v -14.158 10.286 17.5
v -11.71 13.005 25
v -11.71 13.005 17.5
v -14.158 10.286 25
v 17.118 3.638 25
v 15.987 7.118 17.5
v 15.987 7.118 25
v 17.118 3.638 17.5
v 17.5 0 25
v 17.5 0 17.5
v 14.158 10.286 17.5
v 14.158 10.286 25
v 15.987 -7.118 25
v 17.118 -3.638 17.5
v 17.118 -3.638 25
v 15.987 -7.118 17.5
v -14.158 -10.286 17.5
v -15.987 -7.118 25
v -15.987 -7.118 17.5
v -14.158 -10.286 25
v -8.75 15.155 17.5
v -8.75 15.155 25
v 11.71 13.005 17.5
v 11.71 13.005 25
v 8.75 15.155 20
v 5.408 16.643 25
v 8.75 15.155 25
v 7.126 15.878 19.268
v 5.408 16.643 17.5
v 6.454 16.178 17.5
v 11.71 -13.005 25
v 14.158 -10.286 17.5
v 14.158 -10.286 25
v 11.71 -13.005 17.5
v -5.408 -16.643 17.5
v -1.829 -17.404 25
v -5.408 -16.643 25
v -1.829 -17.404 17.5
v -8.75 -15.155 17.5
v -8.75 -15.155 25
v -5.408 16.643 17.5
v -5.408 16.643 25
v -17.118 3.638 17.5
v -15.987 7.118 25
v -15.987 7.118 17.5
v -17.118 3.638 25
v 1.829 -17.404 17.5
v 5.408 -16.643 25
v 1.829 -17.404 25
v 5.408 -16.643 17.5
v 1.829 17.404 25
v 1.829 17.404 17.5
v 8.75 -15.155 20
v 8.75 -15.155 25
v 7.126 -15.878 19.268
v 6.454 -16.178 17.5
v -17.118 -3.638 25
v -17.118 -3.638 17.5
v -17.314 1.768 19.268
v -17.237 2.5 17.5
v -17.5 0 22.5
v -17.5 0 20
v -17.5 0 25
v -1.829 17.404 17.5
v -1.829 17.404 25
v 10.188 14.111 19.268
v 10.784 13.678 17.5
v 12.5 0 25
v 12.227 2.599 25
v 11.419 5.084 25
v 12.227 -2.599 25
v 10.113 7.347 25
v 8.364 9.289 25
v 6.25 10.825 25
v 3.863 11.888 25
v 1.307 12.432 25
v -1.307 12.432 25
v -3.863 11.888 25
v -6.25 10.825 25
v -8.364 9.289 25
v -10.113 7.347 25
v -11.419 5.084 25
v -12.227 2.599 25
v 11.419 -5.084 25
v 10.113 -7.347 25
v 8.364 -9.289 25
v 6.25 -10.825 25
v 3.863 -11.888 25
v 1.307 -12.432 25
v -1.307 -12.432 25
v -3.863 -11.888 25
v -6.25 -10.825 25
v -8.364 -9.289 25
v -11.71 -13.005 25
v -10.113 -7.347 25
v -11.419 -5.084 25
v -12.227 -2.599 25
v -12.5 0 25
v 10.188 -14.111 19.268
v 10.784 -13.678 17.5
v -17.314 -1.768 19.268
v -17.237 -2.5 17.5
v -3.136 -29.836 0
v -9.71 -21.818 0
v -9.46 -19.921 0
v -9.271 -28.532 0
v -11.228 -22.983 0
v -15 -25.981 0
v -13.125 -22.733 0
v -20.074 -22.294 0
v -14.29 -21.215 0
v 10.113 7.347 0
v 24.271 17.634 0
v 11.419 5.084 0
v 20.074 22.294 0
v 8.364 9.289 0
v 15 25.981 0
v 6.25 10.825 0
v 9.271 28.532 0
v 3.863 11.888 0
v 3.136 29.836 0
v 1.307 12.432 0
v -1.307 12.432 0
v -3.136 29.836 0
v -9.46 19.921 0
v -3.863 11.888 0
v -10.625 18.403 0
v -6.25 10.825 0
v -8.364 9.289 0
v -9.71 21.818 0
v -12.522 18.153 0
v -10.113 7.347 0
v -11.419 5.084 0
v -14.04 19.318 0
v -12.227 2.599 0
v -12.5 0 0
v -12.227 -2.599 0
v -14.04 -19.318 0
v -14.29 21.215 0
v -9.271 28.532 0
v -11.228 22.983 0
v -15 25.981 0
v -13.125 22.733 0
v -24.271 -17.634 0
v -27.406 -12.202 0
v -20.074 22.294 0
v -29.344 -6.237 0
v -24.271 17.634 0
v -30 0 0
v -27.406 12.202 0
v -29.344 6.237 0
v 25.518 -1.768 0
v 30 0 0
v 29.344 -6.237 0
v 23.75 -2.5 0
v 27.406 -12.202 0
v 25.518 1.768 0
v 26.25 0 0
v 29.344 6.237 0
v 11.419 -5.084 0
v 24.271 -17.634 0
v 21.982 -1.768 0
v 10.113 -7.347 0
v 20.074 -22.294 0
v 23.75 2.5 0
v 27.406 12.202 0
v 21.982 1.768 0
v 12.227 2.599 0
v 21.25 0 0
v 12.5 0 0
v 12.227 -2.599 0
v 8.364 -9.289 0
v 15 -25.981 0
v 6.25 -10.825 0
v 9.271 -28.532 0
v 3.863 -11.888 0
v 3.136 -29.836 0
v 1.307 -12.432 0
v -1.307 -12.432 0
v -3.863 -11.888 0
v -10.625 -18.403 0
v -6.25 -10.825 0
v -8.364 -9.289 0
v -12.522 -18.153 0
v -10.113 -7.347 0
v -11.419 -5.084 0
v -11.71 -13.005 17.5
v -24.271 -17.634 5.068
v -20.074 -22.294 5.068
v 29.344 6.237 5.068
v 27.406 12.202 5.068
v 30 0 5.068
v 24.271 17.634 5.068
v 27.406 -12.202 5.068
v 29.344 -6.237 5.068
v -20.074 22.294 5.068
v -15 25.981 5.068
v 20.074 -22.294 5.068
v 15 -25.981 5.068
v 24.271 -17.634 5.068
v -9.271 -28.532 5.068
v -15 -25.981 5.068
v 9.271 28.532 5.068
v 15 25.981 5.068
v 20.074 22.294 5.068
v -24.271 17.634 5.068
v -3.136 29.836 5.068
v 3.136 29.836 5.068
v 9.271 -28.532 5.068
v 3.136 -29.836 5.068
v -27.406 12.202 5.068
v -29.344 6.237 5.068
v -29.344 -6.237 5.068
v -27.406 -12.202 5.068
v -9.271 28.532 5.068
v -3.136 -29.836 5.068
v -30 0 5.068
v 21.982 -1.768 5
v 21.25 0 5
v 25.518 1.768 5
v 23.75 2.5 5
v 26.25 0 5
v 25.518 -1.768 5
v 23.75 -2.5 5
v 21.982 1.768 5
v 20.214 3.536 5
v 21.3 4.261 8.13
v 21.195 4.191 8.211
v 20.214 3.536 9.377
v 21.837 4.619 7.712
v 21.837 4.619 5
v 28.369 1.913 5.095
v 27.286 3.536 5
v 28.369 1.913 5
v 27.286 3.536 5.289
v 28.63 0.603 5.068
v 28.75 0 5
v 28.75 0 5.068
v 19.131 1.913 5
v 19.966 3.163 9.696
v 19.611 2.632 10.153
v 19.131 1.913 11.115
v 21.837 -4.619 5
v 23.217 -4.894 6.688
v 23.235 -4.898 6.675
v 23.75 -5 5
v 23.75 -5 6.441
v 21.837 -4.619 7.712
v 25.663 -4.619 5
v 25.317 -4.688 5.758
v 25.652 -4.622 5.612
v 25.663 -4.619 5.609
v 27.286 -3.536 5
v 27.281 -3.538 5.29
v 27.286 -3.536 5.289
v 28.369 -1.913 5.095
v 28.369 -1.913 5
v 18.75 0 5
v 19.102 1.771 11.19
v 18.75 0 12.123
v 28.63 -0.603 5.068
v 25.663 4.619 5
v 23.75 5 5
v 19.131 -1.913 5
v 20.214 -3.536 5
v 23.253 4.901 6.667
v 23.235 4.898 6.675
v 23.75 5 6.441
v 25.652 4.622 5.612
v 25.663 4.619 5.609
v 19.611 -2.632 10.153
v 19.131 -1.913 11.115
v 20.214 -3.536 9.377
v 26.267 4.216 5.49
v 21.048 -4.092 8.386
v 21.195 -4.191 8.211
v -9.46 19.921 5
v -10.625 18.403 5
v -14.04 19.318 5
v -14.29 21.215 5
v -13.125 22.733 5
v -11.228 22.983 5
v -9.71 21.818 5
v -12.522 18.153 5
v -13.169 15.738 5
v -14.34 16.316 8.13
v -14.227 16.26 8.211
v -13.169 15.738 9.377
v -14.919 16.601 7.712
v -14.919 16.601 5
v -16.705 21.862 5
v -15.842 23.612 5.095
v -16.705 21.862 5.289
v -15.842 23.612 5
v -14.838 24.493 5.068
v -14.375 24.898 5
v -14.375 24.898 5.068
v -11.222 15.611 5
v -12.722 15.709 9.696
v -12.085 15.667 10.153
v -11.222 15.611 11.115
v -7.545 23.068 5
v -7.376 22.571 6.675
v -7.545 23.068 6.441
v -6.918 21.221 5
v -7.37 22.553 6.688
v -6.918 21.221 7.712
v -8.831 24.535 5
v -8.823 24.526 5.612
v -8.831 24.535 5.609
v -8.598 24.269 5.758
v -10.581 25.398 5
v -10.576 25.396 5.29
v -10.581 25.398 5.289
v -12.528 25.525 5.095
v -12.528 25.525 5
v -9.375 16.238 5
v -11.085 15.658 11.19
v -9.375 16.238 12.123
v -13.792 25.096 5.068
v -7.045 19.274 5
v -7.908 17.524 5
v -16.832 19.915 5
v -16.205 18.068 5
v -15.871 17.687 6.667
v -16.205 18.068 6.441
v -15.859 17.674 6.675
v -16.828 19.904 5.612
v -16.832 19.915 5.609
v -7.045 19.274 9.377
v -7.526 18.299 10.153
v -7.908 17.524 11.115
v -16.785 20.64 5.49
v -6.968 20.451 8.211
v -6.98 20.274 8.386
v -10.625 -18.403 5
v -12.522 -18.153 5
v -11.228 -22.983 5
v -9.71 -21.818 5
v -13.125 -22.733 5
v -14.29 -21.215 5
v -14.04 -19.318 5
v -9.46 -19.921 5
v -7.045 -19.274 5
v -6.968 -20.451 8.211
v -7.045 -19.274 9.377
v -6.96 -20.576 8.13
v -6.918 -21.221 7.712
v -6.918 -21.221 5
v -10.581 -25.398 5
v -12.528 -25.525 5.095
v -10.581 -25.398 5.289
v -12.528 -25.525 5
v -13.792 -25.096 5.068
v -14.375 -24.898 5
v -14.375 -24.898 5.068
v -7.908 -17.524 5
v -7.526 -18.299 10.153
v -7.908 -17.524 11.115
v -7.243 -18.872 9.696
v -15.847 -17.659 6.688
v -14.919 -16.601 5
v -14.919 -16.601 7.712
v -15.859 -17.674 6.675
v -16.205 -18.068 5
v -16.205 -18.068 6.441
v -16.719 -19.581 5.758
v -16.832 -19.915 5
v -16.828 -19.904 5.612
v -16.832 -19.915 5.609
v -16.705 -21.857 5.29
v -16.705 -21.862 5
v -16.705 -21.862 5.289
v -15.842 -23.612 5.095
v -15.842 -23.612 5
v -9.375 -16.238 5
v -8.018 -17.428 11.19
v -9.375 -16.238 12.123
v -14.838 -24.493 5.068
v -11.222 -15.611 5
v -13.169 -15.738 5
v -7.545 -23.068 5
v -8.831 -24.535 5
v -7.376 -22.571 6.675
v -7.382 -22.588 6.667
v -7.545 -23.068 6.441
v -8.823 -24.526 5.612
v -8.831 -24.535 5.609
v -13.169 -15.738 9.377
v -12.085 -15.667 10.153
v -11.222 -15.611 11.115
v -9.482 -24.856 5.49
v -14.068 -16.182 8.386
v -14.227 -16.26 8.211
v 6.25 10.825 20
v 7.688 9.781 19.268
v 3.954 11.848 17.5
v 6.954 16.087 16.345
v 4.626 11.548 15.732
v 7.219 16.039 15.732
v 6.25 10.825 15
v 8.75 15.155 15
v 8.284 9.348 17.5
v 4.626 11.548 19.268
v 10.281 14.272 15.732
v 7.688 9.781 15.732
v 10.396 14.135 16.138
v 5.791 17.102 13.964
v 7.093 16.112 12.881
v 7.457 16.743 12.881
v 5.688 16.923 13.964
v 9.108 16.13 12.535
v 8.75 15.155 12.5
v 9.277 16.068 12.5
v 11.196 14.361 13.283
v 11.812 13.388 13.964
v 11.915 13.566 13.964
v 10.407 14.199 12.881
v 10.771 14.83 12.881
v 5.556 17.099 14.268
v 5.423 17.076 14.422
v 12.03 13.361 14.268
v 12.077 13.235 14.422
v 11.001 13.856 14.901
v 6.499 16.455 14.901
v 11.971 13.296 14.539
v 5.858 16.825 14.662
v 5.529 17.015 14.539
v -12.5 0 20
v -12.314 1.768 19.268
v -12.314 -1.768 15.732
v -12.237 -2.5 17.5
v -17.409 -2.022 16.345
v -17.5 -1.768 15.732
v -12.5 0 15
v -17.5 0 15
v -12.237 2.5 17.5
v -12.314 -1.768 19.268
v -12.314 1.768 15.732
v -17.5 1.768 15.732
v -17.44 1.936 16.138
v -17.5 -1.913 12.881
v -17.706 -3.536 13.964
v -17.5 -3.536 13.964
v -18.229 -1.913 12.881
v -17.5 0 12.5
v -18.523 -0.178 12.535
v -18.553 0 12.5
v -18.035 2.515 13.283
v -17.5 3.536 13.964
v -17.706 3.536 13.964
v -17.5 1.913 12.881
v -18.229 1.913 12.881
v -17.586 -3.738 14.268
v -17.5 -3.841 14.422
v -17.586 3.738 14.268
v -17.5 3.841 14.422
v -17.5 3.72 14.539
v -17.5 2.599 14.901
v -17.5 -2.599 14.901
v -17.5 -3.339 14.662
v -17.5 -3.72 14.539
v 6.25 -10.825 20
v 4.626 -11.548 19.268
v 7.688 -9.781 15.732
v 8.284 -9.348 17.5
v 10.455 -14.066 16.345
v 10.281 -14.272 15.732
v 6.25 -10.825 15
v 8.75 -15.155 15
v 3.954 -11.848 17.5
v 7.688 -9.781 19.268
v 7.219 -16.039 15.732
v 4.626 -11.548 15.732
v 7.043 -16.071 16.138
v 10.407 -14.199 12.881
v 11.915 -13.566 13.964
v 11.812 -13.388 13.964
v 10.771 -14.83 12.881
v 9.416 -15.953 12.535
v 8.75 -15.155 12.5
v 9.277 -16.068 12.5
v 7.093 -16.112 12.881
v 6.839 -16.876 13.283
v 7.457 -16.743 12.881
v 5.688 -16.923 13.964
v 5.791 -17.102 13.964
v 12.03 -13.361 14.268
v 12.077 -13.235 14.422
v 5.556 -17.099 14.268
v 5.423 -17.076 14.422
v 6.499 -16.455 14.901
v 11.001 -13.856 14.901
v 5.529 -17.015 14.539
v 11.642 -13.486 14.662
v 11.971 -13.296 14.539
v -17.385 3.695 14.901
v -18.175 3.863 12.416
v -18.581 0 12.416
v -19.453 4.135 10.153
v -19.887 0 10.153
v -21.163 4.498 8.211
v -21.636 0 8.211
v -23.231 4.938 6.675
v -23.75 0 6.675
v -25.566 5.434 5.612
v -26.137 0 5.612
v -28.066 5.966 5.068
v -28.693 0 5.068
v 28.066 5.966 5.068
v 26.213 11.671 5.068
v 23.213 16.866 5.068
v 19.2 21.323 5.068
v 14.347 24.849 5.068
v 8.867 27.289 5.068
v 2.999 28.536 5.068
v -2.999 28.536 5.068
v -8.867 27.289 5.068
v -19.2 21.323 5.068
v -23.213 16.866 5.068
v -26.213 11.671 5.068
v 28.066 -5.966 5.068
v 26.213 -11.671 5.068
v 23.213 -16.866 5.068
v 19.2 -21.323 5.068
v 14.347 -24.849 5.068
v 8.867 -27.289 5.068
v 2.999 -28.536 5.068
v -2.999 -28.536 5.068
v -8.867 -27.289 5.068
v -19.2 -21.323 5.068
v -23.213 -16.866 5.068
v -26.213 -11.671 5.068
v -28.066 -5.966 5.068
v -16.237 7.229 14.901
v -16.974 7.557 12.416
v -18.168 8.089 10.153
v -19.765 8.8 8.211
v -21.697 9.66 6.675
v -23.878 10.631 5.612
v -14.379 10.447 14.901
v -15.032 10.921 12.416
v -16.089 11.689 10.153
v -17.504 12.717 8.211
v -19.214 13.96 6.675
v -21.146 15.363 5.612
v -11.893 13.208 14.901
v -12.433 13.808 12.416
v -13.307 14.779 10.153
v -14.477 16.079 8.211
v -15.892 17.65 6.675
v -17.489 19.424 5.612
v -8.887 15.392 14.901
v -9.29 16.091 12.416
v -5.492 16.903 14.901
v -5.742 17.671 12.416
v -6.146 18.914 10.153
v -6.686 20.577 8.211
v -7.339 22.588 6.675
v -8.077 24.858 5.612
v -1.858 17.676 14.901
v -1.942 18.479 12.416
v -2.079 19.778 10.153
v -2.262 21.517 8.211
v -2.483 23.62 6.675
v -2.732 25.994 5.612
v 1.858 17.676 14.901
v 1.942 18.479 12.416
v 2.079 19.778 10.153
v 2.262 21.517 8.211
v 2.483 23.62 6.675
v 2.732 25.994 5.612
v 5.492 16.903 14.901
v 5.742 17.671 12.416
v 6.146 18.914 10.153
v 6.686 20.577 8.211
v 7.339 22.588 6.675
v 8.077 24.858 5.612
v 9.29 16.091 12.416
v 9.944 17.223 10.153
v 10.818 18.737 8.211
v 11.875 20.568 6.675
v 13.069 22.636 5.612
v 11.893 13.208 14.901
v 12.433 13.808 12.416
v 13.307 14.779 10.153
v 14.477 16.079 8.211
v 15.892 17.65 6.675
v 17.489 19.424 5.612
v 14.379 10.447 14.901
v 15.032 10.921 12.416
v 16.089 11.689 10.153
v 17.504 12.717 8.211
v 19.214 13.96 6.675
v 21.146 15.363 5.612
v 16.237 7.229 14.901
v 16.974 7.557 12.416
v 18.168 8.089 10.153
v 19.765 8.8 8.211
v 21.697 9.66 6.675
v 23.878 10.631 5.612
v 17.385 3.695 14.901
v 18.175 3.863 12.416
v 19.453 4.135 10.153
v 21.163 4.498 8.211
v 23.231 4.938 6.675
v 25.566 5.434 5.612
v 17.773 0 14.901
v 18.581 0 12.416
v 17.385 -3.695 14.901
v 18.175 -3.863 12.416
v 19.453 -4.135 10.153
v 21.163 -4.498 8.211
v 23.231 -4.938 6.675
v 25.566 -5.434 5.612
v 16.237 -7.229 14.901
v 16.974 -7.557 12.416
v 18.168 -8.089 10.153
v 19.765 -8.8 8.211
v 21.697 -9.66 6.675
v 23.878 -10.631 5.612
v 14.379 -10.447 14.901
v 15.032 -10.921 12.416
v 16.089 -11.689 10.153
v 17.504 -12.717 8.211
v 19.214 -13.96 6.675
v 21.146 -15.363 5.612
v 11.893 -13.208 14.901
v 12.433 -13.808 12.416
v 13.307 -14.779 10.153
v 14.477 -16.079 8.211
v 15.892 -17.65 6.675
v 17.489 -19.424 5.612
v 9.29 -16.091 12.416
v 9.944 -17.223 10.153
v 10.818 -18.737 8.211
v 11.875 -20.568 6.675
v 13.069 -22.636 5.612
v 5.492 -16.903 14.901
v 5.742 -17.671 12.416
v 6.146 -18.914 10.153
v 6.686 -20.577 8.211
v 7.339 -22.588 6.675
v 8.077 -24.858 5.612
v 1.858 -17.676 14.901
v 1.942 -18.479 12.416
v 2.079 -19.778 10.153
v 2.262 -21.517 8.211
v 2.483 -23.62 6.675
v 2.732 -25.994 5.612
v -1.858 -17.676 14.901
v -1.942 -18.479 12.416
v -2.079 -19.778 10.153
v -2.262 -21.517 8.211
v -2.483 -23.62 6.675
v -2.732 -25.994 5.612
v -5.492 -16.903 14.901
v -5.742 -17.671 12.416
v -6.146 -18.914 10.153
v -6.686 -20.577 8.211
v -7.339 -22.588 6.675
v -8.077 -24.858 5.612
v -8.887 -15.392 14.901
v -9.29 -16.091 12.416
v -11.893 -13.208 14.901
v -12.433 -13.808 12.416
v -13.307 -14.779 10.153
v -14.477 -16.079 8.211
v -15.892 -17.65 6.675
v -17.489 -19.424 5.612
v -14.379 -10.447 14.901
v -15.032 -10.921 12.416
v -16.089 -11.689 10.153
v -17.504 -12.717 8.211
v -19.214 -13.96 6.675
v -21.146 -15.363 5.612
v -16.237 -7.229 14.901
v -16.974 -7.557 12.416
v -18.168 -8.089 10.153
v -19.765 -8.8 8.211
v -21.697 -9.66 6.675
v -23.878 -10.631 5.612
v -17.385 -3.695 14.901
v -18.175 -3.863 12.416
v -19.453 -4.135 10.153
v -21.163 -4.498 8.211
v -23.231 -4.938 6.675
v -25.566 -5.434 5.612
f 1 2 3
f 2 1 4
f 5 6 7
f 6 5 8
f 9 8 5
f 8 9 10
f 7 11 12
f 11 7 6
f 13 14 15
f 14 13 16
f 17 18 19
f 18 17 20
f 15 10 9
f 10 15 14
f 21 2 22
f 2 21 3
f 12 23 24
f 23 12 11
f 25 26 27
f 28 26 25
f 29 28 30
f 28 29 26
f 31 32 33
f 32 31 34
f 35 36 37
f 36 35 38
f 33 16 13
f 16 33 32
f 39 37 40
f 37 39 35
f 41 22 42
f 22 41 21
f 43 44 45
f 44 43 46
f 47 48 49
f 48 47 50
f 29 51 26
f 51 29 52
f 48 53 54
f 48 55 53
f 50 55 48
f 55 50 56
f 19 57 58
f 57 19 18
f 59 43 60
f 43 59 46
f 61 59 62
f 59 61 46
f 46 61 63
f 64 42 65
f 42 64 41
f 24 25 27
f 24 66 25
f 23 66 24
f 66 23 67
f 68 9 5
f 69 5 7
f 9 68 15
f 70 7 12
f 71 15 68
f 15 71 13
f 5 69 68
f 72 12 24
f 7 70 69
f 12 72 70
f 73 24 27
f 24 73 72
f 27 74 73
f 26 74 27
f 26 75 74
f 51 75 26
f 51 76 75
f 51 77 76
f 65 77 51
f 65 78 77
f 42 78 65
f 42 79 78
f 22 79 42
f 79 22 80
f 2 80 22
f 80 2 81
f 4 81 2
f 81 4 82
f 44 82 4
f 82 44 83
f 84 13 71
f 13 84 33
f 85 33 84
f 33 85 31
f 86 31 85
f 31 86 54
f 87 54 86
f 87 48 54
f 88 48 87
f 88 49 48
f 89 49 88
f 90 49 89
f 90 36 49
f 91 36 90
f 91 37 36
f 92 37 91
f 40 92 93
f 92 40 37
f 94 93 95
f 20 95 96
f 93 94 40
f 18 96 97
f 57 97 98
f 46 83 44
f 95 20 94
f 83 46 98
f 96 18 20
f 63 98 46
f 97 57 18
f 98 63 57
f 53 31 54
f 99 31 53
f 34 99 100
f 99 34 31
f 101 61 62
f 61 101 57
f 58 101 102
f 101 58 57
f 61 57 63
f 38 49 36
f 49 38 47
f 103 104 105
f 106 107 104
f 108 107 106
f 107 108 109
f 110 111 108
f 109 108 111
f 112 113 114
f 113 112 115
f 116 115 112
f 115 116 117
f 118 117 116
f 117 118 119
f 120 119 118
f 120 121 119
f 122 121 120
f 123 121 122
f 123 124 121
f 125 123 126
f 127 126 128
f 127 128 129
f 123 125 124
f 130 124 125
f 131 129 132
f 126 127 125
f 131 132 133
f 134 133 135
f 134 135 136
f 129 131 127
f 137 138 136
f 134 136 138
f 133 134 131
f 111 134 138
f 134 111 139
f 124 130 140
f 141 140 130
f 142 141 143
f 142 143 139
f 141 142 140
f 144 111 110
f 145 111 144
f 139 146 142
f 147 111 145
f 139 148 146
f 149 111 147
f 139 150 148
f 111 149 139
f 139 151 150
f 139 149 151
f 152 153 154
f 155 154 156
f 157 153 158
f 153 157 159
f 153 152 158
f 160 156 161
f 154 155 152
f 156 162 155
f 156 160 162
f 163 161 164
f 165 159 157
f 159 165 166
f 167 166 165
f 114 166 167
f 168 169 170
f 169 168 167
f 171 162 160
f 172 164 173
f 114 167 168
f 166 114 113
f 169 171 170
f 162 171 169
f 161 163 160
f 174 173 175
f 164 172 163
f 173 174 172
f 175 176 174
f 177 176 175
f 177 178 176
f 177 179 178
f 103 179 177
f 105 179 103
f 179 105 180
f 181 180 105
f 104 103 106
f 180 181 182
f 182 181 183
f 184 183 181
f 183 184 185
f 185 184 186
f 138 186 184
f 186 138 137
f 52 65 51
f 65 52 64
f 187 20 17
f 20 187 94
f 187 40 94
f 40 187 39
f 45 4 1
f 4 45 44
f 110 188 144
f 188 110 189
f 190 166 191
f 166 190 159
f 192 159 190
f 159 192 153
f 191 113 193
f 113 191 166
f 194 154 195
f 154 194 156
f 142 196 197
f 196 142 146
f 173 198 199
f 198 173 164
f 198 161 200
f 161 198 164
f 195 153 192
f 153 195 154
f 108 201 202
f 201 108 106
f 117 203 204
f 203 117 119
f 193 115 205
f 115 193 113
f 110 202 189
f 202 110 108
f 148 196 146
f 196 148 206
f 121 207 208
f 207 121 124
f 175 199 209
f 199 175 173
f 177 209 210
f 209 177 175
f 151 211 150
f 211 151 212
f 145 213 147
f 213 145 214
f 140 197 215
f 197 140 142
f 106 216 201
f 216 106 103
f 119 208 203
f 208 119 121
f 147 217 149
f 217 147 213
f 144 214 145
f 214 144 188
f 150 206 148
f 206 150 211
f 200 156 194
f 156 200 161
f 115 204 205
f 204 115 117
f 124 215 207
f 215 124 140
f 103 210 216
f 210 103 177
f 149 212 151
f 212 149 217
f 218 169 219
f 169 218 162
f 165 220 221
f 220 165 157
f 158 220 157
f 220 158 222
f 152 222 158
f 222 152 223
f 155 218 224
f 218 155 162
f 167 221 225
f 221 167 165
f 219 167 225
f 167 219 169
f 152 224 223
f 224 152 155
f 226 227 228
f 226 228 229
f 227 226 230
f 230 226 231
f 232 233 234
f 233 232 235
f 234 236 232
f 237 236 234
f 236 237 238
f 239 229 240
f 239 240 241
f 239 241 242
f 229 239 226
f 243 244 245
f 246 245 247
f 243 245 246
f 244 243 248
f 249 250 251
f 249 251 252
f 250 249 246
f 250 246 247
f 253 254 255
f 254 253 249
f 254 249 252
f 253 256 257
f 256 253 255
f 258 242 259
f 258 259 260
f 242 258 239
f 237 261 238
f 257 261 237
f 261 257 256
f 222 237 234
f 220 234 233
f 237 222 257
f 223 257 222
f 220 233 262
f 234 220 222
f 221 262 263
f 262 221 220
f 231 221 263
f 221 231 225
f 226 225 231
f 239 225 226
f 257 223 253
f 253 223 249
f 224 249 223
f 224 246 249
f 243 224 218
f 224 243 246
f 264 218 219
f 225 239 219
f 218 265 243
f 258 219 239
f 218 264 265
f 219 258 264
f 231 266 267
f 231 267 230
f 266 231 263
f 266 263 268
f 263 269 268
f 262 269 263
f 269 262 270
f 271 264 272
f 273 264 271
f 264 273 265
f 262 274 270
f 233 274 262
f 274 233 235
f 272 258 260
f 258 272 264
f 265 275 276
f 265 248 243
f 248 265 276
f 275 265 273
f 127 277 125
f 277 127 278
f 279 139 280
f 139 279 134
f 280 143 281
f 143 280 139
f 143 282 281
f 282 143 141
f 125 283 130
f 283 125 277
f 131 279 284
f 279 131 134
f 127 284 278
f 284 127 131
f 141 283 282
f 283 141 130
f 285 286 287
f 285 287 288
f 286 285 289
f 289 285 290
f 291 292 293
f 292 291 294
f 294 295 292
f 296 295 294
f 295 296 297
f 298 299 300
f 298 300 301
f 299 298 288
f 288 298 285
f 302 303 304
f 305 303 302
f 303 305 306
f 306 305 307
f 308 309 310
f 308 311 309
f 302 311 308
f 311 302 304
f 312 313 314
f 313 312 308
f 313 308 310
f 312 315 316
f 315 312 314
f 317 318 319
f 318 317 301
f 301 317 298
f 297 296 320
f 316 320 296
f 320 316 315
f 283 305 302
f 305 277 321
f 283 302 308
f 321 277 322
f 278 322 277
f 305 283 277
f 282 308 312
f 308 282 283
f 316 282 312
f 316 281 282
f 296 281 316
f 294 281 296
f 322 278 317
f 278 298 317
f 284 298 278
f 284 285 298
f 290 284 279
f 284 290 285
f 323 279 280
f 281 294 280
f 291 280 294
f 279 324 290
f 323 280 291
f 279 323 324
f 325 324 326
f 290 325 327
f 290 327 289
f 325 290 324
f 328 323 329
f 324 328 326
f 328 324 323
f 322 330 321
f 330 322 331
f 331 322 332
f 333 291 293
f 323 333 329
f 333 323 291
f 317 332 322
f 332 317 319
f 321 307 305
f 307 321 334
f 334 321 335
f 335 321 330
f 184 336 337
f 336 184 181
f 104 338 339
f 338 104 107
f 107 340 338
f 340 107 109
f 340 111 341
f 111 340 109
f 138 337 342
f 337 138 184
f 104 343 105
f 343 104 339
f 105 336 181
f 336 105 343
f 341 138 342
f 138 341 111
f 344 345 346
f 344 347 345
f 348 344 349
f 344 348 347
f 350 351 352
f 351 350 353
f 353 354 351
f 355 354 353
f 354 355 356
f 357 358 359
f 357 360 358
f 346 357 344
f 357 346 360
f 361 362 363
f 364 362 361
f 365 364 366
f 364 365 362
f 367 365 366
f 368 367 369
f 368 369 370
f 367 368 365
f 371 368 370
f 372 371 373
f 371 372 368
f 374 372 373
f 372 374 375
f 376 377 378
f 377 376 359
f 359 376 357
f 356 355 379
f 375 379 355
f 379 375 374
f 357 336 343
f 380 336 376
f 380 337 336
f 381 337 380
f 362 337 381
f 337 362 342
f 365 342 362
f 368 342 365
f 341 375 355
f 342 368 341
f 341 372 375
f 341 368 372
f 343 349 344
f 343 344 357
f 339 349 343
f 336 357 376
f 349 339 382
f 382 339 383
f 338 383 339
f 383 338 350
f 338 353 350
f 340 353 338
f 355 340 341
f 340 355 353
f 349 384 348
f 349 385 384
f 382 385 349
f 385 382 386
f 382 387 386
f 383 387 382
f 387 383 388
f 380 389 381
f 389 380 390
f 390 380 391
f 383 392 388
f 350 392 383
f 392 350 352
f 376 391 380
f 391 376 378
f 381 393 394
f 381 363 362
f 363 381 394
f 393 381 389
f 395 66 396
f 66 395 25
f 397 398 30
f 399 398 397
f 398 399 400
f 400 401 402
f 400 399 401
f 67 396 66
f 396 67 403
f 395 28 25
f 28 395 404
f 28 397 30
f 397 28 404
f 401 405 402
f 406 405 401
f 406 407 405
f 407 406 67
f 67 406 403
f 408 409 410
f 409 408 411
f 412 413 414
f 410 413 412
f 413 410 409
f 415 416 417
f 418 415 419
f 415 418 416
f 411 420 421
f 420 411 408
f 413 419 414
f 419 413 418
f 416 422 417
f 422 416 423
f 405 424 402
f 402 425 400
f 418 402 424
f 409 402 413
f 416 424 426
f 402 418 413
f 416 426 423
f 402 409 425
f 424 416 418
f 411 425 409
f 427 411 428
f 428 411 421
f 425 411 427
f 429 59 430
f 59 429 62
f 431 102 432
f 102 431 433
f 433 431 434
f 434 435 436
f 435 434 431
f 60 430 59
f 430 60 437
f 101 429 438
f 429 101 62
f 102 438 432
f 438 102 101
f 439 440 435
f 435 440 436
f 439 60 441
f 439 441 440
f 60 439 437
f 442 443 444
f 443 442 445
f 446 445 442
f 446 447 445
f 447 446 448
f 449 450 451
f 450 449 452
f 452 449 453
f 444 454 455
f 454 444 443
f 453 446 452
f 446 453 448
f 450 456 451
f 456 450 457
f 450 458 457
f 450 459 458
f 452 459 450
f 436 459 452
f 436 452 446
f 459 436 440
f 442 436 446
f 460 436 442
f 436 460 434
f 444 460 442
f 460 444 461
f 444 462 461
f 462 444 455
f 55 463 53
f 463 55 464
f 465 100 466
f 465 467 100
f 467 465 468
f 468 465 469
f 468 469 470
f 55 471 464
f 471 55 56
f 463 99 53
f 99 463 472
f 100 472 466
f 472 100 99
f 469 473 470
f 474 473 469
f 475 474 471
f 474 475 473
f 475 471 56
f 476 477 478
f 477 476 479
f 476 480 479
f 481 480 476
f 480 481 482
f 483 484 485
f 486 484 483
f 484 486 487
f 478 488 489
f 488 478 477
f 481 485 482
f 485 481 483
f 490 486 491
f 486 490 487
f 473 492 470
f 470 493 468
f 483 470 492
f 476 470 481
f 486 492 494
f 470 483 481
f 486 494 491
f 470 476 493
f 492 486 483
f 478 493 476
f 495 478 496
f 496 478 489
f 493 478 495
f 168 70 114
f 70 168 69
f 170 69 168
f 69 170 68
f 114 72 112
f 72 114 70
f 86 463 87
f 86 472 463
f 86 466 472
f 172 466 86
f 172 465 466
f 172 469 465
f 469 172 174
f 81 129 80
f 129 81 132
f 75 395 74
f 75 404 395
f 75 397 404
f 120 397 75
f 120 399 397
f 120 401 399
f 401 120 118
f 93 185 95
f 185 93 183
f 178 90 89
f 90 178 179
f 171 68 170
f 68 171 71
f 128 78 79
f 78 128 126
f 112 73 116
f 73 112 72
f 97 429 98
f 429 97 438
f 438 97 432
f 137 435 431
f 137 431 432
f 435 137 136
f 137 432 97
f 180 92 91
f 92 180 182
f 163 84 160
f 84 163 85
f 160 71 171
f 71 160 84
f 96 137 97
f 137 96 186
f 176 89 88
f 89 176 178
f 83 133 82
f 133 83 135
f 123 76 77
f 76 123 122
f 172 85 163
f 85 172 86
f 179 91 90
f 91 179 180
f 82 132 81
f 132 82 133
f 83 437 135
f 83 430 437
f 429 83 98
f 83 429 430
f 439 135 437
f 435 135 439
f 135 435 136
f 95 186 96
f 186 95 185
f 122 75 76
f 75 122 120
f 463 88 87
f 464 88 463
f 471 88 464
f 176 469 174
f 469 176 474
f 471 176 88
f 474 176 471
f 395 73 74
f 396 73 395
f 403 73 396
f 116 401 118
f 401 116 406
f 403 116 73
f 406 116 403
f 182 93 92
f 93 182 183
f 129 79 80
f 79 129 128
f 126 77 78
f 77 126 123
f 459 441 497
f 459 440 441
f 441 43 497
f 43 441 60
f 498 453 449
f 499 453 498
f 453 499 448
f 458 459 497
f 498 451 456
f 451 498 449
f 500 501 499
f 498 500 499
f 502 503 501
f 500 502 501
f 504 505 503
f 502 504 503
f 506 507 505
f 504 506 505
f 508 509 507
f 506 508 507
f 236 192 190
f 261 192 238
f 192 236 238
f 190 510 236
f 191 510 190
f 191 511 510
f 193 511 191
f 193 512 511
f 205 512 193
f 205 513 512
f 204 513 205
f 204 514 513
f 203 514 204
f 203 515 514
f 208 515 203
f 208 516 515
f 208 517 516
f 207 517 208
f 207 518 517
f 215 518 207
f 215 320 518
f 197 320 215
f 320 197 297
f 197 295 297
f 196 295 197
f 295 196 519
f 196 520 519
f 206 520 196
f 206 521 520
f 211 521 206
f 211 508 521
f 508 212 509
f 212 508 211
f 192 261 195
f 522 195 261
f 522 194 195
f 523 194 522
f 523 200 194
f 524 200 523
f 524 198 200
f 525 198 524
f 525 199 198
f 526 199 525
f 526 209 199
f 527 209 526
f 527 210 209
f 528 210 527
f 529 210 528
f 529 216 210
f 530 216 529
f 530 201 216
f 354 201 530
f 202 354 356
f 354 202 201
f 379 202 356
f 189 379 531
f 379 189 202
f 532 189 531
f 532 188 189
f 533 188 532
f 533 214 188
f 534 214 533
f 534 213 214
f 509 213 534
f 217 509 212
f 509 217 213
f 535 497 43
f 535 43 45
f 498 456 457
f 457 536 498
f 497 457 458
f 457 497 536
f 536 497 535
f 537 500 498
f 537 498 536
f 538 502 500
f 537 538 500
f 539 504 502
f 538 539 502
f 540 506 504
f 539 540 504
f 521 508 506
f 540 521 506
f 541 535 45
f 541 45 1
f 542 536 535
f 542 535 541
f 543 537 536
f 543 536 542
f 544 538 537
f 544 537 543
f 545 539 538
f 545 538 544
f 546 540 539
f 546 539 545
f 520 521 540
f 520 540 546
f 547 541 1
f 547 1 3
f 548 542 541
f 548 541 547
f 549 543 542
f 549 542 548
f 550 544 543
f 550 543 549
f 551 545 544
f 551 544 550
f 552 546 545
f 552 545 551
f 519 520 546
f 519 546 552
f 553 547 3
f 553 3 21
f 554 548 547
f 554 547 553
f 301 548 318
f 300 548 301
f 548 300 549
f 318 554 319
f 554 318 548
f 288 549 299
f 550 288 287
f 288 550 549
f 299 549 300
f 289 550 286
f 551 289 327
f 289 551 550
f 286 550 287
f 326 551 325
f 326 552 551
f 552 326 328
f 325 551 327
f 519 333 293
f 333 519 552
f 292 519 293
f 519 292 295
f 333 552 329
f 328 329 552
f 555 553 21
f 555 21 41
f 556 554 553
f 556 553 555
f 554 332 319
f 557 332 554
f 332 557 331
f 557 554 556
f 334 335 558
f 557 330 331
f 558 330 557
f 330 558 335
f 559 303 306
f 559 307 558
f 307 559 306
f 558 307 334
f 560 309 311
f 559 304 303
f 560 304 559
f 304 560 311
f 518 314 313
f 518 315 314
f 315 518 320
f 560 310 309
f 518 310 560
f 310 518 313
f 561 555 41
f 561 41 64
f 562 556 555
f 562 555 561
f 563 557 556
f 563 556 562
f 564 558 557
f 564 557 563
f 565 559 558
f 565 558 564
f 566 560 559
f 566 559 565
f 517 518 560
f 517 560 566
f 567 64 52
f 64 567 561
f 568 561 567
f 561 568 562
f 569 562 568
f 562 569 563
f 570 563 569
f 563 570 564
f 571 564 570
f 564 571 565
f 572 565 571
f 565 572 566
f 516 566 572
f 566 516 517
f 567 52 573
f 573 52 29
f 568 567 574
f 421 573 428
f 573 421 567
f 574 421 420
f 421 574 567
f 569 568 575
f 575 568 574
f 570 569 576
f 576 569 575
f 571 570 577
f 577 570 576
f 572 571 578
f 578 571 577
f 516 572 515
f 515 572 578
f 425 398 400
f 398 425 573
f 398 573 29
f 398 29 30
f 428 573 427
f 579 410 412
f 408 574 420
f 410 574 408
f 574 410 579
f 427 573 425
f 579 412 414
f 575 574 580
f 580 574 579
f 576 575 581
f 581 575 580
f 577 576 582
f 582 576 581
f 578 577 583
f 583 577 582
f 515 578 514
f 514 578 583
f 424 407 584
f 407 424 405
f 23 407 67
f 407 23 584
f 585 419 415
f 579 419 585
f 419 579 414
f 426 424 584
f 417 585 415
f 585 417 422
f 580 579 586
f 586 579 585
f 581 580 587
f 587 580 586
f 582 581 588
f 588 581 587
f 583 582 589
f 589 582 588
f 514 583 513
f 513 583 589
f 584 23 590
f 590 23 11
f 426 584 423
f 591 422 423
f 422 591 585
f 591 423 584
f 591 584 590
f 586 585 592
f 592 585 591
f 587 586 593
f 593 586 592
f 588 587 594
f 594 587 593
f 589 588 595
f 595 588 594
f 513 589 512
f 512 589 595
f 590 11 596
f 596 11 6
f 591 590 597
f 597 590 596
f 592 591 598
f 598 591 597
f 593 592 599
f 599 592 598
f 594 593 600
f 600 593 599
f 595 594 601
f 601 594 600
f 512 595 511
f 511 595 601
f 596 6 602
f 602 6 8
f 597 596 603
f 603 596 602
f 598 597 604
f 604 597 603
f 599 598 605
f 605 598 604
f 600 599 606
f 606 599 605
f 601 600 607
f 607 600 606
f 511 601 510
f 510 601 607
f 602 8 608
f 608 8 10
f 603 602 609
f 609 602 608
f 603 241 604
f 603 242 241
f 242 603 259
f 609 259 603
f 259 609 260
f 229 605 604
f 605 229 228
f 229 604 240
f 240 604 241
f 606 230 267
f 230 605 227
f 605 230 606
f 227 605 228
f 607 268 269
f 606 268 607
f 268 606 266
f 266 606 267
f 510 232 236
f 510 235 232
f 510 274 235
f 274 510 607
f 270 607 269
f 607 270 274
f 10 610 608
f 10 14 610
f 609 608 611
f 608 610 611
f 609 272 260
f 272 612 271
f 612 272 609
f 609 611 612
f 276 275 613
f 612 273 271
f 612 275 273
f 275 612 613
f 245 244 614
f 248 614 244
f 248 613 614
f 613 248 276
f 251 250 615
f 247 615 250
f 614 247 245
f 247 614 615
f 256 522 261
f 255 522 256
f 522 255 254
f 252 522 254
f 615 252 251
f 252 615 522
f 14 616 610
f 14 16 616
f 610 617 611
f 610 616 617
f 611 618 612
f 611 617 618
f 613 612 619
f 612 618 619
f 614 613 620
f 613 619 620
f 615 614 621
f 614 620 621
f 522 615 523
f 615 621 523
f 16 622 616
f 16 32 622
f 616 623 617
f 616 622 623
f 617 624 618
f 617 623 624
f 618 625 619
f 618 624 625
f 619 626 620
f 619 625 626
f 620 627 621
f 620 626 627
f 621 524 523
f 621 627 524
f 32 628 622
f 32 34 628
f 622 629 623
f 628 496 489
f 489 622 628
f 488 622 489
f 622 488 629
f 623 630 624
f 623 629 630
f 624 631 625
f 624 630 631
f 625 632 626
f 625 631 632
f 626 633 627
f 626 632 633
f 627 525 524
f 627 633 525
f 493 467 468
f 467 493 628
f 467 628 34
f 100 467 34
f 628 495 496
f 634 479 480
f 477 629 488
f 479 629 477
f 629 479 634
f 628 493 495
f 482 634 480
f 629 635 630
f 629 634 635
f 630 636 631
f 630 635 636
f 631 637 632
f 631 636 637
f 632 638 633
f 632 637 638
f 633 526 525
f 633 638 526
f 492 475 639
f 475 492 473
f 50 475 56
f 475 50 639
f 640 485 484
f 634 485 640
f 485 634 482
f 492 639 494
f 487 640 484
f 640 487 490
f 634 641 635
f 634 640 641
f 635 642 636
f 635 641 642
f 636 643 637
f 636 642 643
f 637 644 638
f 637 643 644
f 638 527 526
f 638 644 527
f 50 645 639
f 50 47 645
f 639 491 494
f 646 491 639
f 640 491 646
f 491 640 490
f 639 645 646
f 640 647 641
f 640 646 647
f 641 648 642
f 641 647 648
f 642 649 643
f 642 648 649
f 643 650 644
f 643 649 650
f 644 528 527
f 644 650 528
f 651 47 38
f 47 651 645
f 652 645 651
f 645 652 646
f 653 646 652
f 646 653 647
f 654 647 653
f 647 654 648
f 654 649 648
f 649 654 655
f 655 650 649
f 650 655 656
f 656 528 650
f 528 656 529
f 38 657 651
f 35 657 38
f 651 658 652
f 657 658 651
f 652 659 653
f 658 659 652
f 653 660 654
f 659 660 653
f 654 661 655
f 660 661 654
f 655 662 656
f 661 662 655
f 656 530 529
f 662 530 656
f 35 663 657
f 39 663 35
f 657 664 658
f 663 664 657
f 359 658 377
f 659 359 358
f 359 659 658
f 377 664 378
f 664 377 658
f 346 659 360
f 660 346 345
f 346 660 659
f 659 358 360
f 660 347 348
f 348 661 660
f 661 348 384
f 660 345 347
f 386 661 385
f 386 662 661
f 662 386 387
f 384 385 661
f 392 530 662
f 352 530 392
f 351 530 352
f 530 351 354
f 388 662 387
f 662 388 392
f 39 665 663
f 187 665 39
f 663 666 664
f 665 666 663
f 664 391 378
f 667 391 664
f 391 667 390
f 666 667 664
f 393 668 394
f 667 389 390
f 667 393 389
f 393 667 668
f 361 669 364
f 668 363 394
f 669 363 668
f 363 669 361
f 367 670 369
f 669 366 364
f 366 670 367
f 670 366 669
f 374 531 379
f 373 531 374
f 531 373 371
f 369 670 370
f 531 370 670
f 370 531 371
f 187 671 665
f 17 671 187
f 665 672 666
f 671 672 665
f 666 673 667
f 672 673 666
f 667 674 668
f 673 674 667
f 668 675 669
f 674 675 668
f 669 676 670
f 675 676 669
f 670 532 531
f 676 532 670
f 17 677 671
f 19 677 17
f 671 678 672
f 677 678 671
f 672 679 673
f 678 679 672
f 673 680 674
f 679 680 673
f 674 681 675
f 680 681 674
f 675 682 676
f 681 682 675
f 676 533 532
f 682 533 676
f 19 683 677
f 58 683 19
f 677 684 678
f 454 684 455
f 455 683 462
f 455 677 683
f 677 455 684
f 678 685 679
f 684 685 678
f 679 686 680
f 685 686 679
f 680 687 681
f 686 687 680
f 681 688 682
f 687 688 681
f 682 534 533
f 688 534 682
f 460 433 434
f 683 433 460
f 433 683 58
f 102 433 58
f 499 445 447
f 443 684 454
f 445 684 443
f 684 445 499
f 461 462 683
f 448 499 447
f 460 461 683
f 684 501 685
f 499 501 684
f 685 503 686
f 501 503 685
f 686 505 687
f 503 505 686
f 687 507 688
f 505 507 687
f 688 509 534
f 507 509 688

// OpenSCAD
// Pipe or Rod Mounting Flange
// (c) 2013, Christopher "ScribbleJ" Jansen


// Minimum Thickness of Object
min_thick = 5;
// Diameter of Pipe/Rod
pipe_d    = 25;
// Diameter of Flange
flange_d  = 60;
// Height of Object
height    = 25;

// Number of Setscrew Holes
num_setscrews = 3;
// Number of Flange Bolts
num_bolts = 3;

// Diameter of Flange Bolt
bolt_d    = 5;
// Diameter of Flange Bolthead
bolthead_d = 10;

// Diameter of "Setscrew" Bolt
setscrew_d = 5;
// Diameter of "Setscrew" Bolthead
setscrewhead_d = 10;

/* [Hidden] */

s = flange_d - pipe_d - min_thick*2;

difference()
{
  union()
  {
    cylinder(r=pipe_d/2 + min_thick, h=height);
    cylinder(r=flange_d/2, h=s/2 + min_thick);
  }

  // Pipehole
  translate([0,0,-1]) cylinder(r=pipe_d/2, h=height+2);

  // Bolts
  if(num_bolts > 0)
  {
    for(x=[0:360/num_bolts:num_bolts*(360/num_bolts)])
    {
      rotate([0,0,x]) 
      {
        translate([pipe_d/2 + min_thick + s/4,0,-1]) 
        {
          cylinder(r=bolt_d/2, h=height);
          translate([0,0,min_thick + 1]) cylinder(r=bolthead_d/2, h=height);
        }
      }
    }
  }

  // Chamfer
  translate([0,0,min_thick+s/2]) rotate_extrude() translate([pipe_d/2+min_thick+s/2,0,0]) circle(r=s/2);

  // Setscrews
  if(num_setscrews > 0)
  {
    for(x=[0:360/num_setscrews:num_setscrews*(360/num_setscrews)])
    {
      translate([0,0,min_thick+s/2]) rotate([0,0,(360/(num_setscrews*2))+x]) rotate([0,90,0])
      {
        cylinder(r=setscrew_d/2, h=flange_d/2);
        translate([0,0,pipe_d/2 + min_thick]) cylinder(r=setscrewhead_d/2, h=flange_d/2);
      }
    }
  }


}
